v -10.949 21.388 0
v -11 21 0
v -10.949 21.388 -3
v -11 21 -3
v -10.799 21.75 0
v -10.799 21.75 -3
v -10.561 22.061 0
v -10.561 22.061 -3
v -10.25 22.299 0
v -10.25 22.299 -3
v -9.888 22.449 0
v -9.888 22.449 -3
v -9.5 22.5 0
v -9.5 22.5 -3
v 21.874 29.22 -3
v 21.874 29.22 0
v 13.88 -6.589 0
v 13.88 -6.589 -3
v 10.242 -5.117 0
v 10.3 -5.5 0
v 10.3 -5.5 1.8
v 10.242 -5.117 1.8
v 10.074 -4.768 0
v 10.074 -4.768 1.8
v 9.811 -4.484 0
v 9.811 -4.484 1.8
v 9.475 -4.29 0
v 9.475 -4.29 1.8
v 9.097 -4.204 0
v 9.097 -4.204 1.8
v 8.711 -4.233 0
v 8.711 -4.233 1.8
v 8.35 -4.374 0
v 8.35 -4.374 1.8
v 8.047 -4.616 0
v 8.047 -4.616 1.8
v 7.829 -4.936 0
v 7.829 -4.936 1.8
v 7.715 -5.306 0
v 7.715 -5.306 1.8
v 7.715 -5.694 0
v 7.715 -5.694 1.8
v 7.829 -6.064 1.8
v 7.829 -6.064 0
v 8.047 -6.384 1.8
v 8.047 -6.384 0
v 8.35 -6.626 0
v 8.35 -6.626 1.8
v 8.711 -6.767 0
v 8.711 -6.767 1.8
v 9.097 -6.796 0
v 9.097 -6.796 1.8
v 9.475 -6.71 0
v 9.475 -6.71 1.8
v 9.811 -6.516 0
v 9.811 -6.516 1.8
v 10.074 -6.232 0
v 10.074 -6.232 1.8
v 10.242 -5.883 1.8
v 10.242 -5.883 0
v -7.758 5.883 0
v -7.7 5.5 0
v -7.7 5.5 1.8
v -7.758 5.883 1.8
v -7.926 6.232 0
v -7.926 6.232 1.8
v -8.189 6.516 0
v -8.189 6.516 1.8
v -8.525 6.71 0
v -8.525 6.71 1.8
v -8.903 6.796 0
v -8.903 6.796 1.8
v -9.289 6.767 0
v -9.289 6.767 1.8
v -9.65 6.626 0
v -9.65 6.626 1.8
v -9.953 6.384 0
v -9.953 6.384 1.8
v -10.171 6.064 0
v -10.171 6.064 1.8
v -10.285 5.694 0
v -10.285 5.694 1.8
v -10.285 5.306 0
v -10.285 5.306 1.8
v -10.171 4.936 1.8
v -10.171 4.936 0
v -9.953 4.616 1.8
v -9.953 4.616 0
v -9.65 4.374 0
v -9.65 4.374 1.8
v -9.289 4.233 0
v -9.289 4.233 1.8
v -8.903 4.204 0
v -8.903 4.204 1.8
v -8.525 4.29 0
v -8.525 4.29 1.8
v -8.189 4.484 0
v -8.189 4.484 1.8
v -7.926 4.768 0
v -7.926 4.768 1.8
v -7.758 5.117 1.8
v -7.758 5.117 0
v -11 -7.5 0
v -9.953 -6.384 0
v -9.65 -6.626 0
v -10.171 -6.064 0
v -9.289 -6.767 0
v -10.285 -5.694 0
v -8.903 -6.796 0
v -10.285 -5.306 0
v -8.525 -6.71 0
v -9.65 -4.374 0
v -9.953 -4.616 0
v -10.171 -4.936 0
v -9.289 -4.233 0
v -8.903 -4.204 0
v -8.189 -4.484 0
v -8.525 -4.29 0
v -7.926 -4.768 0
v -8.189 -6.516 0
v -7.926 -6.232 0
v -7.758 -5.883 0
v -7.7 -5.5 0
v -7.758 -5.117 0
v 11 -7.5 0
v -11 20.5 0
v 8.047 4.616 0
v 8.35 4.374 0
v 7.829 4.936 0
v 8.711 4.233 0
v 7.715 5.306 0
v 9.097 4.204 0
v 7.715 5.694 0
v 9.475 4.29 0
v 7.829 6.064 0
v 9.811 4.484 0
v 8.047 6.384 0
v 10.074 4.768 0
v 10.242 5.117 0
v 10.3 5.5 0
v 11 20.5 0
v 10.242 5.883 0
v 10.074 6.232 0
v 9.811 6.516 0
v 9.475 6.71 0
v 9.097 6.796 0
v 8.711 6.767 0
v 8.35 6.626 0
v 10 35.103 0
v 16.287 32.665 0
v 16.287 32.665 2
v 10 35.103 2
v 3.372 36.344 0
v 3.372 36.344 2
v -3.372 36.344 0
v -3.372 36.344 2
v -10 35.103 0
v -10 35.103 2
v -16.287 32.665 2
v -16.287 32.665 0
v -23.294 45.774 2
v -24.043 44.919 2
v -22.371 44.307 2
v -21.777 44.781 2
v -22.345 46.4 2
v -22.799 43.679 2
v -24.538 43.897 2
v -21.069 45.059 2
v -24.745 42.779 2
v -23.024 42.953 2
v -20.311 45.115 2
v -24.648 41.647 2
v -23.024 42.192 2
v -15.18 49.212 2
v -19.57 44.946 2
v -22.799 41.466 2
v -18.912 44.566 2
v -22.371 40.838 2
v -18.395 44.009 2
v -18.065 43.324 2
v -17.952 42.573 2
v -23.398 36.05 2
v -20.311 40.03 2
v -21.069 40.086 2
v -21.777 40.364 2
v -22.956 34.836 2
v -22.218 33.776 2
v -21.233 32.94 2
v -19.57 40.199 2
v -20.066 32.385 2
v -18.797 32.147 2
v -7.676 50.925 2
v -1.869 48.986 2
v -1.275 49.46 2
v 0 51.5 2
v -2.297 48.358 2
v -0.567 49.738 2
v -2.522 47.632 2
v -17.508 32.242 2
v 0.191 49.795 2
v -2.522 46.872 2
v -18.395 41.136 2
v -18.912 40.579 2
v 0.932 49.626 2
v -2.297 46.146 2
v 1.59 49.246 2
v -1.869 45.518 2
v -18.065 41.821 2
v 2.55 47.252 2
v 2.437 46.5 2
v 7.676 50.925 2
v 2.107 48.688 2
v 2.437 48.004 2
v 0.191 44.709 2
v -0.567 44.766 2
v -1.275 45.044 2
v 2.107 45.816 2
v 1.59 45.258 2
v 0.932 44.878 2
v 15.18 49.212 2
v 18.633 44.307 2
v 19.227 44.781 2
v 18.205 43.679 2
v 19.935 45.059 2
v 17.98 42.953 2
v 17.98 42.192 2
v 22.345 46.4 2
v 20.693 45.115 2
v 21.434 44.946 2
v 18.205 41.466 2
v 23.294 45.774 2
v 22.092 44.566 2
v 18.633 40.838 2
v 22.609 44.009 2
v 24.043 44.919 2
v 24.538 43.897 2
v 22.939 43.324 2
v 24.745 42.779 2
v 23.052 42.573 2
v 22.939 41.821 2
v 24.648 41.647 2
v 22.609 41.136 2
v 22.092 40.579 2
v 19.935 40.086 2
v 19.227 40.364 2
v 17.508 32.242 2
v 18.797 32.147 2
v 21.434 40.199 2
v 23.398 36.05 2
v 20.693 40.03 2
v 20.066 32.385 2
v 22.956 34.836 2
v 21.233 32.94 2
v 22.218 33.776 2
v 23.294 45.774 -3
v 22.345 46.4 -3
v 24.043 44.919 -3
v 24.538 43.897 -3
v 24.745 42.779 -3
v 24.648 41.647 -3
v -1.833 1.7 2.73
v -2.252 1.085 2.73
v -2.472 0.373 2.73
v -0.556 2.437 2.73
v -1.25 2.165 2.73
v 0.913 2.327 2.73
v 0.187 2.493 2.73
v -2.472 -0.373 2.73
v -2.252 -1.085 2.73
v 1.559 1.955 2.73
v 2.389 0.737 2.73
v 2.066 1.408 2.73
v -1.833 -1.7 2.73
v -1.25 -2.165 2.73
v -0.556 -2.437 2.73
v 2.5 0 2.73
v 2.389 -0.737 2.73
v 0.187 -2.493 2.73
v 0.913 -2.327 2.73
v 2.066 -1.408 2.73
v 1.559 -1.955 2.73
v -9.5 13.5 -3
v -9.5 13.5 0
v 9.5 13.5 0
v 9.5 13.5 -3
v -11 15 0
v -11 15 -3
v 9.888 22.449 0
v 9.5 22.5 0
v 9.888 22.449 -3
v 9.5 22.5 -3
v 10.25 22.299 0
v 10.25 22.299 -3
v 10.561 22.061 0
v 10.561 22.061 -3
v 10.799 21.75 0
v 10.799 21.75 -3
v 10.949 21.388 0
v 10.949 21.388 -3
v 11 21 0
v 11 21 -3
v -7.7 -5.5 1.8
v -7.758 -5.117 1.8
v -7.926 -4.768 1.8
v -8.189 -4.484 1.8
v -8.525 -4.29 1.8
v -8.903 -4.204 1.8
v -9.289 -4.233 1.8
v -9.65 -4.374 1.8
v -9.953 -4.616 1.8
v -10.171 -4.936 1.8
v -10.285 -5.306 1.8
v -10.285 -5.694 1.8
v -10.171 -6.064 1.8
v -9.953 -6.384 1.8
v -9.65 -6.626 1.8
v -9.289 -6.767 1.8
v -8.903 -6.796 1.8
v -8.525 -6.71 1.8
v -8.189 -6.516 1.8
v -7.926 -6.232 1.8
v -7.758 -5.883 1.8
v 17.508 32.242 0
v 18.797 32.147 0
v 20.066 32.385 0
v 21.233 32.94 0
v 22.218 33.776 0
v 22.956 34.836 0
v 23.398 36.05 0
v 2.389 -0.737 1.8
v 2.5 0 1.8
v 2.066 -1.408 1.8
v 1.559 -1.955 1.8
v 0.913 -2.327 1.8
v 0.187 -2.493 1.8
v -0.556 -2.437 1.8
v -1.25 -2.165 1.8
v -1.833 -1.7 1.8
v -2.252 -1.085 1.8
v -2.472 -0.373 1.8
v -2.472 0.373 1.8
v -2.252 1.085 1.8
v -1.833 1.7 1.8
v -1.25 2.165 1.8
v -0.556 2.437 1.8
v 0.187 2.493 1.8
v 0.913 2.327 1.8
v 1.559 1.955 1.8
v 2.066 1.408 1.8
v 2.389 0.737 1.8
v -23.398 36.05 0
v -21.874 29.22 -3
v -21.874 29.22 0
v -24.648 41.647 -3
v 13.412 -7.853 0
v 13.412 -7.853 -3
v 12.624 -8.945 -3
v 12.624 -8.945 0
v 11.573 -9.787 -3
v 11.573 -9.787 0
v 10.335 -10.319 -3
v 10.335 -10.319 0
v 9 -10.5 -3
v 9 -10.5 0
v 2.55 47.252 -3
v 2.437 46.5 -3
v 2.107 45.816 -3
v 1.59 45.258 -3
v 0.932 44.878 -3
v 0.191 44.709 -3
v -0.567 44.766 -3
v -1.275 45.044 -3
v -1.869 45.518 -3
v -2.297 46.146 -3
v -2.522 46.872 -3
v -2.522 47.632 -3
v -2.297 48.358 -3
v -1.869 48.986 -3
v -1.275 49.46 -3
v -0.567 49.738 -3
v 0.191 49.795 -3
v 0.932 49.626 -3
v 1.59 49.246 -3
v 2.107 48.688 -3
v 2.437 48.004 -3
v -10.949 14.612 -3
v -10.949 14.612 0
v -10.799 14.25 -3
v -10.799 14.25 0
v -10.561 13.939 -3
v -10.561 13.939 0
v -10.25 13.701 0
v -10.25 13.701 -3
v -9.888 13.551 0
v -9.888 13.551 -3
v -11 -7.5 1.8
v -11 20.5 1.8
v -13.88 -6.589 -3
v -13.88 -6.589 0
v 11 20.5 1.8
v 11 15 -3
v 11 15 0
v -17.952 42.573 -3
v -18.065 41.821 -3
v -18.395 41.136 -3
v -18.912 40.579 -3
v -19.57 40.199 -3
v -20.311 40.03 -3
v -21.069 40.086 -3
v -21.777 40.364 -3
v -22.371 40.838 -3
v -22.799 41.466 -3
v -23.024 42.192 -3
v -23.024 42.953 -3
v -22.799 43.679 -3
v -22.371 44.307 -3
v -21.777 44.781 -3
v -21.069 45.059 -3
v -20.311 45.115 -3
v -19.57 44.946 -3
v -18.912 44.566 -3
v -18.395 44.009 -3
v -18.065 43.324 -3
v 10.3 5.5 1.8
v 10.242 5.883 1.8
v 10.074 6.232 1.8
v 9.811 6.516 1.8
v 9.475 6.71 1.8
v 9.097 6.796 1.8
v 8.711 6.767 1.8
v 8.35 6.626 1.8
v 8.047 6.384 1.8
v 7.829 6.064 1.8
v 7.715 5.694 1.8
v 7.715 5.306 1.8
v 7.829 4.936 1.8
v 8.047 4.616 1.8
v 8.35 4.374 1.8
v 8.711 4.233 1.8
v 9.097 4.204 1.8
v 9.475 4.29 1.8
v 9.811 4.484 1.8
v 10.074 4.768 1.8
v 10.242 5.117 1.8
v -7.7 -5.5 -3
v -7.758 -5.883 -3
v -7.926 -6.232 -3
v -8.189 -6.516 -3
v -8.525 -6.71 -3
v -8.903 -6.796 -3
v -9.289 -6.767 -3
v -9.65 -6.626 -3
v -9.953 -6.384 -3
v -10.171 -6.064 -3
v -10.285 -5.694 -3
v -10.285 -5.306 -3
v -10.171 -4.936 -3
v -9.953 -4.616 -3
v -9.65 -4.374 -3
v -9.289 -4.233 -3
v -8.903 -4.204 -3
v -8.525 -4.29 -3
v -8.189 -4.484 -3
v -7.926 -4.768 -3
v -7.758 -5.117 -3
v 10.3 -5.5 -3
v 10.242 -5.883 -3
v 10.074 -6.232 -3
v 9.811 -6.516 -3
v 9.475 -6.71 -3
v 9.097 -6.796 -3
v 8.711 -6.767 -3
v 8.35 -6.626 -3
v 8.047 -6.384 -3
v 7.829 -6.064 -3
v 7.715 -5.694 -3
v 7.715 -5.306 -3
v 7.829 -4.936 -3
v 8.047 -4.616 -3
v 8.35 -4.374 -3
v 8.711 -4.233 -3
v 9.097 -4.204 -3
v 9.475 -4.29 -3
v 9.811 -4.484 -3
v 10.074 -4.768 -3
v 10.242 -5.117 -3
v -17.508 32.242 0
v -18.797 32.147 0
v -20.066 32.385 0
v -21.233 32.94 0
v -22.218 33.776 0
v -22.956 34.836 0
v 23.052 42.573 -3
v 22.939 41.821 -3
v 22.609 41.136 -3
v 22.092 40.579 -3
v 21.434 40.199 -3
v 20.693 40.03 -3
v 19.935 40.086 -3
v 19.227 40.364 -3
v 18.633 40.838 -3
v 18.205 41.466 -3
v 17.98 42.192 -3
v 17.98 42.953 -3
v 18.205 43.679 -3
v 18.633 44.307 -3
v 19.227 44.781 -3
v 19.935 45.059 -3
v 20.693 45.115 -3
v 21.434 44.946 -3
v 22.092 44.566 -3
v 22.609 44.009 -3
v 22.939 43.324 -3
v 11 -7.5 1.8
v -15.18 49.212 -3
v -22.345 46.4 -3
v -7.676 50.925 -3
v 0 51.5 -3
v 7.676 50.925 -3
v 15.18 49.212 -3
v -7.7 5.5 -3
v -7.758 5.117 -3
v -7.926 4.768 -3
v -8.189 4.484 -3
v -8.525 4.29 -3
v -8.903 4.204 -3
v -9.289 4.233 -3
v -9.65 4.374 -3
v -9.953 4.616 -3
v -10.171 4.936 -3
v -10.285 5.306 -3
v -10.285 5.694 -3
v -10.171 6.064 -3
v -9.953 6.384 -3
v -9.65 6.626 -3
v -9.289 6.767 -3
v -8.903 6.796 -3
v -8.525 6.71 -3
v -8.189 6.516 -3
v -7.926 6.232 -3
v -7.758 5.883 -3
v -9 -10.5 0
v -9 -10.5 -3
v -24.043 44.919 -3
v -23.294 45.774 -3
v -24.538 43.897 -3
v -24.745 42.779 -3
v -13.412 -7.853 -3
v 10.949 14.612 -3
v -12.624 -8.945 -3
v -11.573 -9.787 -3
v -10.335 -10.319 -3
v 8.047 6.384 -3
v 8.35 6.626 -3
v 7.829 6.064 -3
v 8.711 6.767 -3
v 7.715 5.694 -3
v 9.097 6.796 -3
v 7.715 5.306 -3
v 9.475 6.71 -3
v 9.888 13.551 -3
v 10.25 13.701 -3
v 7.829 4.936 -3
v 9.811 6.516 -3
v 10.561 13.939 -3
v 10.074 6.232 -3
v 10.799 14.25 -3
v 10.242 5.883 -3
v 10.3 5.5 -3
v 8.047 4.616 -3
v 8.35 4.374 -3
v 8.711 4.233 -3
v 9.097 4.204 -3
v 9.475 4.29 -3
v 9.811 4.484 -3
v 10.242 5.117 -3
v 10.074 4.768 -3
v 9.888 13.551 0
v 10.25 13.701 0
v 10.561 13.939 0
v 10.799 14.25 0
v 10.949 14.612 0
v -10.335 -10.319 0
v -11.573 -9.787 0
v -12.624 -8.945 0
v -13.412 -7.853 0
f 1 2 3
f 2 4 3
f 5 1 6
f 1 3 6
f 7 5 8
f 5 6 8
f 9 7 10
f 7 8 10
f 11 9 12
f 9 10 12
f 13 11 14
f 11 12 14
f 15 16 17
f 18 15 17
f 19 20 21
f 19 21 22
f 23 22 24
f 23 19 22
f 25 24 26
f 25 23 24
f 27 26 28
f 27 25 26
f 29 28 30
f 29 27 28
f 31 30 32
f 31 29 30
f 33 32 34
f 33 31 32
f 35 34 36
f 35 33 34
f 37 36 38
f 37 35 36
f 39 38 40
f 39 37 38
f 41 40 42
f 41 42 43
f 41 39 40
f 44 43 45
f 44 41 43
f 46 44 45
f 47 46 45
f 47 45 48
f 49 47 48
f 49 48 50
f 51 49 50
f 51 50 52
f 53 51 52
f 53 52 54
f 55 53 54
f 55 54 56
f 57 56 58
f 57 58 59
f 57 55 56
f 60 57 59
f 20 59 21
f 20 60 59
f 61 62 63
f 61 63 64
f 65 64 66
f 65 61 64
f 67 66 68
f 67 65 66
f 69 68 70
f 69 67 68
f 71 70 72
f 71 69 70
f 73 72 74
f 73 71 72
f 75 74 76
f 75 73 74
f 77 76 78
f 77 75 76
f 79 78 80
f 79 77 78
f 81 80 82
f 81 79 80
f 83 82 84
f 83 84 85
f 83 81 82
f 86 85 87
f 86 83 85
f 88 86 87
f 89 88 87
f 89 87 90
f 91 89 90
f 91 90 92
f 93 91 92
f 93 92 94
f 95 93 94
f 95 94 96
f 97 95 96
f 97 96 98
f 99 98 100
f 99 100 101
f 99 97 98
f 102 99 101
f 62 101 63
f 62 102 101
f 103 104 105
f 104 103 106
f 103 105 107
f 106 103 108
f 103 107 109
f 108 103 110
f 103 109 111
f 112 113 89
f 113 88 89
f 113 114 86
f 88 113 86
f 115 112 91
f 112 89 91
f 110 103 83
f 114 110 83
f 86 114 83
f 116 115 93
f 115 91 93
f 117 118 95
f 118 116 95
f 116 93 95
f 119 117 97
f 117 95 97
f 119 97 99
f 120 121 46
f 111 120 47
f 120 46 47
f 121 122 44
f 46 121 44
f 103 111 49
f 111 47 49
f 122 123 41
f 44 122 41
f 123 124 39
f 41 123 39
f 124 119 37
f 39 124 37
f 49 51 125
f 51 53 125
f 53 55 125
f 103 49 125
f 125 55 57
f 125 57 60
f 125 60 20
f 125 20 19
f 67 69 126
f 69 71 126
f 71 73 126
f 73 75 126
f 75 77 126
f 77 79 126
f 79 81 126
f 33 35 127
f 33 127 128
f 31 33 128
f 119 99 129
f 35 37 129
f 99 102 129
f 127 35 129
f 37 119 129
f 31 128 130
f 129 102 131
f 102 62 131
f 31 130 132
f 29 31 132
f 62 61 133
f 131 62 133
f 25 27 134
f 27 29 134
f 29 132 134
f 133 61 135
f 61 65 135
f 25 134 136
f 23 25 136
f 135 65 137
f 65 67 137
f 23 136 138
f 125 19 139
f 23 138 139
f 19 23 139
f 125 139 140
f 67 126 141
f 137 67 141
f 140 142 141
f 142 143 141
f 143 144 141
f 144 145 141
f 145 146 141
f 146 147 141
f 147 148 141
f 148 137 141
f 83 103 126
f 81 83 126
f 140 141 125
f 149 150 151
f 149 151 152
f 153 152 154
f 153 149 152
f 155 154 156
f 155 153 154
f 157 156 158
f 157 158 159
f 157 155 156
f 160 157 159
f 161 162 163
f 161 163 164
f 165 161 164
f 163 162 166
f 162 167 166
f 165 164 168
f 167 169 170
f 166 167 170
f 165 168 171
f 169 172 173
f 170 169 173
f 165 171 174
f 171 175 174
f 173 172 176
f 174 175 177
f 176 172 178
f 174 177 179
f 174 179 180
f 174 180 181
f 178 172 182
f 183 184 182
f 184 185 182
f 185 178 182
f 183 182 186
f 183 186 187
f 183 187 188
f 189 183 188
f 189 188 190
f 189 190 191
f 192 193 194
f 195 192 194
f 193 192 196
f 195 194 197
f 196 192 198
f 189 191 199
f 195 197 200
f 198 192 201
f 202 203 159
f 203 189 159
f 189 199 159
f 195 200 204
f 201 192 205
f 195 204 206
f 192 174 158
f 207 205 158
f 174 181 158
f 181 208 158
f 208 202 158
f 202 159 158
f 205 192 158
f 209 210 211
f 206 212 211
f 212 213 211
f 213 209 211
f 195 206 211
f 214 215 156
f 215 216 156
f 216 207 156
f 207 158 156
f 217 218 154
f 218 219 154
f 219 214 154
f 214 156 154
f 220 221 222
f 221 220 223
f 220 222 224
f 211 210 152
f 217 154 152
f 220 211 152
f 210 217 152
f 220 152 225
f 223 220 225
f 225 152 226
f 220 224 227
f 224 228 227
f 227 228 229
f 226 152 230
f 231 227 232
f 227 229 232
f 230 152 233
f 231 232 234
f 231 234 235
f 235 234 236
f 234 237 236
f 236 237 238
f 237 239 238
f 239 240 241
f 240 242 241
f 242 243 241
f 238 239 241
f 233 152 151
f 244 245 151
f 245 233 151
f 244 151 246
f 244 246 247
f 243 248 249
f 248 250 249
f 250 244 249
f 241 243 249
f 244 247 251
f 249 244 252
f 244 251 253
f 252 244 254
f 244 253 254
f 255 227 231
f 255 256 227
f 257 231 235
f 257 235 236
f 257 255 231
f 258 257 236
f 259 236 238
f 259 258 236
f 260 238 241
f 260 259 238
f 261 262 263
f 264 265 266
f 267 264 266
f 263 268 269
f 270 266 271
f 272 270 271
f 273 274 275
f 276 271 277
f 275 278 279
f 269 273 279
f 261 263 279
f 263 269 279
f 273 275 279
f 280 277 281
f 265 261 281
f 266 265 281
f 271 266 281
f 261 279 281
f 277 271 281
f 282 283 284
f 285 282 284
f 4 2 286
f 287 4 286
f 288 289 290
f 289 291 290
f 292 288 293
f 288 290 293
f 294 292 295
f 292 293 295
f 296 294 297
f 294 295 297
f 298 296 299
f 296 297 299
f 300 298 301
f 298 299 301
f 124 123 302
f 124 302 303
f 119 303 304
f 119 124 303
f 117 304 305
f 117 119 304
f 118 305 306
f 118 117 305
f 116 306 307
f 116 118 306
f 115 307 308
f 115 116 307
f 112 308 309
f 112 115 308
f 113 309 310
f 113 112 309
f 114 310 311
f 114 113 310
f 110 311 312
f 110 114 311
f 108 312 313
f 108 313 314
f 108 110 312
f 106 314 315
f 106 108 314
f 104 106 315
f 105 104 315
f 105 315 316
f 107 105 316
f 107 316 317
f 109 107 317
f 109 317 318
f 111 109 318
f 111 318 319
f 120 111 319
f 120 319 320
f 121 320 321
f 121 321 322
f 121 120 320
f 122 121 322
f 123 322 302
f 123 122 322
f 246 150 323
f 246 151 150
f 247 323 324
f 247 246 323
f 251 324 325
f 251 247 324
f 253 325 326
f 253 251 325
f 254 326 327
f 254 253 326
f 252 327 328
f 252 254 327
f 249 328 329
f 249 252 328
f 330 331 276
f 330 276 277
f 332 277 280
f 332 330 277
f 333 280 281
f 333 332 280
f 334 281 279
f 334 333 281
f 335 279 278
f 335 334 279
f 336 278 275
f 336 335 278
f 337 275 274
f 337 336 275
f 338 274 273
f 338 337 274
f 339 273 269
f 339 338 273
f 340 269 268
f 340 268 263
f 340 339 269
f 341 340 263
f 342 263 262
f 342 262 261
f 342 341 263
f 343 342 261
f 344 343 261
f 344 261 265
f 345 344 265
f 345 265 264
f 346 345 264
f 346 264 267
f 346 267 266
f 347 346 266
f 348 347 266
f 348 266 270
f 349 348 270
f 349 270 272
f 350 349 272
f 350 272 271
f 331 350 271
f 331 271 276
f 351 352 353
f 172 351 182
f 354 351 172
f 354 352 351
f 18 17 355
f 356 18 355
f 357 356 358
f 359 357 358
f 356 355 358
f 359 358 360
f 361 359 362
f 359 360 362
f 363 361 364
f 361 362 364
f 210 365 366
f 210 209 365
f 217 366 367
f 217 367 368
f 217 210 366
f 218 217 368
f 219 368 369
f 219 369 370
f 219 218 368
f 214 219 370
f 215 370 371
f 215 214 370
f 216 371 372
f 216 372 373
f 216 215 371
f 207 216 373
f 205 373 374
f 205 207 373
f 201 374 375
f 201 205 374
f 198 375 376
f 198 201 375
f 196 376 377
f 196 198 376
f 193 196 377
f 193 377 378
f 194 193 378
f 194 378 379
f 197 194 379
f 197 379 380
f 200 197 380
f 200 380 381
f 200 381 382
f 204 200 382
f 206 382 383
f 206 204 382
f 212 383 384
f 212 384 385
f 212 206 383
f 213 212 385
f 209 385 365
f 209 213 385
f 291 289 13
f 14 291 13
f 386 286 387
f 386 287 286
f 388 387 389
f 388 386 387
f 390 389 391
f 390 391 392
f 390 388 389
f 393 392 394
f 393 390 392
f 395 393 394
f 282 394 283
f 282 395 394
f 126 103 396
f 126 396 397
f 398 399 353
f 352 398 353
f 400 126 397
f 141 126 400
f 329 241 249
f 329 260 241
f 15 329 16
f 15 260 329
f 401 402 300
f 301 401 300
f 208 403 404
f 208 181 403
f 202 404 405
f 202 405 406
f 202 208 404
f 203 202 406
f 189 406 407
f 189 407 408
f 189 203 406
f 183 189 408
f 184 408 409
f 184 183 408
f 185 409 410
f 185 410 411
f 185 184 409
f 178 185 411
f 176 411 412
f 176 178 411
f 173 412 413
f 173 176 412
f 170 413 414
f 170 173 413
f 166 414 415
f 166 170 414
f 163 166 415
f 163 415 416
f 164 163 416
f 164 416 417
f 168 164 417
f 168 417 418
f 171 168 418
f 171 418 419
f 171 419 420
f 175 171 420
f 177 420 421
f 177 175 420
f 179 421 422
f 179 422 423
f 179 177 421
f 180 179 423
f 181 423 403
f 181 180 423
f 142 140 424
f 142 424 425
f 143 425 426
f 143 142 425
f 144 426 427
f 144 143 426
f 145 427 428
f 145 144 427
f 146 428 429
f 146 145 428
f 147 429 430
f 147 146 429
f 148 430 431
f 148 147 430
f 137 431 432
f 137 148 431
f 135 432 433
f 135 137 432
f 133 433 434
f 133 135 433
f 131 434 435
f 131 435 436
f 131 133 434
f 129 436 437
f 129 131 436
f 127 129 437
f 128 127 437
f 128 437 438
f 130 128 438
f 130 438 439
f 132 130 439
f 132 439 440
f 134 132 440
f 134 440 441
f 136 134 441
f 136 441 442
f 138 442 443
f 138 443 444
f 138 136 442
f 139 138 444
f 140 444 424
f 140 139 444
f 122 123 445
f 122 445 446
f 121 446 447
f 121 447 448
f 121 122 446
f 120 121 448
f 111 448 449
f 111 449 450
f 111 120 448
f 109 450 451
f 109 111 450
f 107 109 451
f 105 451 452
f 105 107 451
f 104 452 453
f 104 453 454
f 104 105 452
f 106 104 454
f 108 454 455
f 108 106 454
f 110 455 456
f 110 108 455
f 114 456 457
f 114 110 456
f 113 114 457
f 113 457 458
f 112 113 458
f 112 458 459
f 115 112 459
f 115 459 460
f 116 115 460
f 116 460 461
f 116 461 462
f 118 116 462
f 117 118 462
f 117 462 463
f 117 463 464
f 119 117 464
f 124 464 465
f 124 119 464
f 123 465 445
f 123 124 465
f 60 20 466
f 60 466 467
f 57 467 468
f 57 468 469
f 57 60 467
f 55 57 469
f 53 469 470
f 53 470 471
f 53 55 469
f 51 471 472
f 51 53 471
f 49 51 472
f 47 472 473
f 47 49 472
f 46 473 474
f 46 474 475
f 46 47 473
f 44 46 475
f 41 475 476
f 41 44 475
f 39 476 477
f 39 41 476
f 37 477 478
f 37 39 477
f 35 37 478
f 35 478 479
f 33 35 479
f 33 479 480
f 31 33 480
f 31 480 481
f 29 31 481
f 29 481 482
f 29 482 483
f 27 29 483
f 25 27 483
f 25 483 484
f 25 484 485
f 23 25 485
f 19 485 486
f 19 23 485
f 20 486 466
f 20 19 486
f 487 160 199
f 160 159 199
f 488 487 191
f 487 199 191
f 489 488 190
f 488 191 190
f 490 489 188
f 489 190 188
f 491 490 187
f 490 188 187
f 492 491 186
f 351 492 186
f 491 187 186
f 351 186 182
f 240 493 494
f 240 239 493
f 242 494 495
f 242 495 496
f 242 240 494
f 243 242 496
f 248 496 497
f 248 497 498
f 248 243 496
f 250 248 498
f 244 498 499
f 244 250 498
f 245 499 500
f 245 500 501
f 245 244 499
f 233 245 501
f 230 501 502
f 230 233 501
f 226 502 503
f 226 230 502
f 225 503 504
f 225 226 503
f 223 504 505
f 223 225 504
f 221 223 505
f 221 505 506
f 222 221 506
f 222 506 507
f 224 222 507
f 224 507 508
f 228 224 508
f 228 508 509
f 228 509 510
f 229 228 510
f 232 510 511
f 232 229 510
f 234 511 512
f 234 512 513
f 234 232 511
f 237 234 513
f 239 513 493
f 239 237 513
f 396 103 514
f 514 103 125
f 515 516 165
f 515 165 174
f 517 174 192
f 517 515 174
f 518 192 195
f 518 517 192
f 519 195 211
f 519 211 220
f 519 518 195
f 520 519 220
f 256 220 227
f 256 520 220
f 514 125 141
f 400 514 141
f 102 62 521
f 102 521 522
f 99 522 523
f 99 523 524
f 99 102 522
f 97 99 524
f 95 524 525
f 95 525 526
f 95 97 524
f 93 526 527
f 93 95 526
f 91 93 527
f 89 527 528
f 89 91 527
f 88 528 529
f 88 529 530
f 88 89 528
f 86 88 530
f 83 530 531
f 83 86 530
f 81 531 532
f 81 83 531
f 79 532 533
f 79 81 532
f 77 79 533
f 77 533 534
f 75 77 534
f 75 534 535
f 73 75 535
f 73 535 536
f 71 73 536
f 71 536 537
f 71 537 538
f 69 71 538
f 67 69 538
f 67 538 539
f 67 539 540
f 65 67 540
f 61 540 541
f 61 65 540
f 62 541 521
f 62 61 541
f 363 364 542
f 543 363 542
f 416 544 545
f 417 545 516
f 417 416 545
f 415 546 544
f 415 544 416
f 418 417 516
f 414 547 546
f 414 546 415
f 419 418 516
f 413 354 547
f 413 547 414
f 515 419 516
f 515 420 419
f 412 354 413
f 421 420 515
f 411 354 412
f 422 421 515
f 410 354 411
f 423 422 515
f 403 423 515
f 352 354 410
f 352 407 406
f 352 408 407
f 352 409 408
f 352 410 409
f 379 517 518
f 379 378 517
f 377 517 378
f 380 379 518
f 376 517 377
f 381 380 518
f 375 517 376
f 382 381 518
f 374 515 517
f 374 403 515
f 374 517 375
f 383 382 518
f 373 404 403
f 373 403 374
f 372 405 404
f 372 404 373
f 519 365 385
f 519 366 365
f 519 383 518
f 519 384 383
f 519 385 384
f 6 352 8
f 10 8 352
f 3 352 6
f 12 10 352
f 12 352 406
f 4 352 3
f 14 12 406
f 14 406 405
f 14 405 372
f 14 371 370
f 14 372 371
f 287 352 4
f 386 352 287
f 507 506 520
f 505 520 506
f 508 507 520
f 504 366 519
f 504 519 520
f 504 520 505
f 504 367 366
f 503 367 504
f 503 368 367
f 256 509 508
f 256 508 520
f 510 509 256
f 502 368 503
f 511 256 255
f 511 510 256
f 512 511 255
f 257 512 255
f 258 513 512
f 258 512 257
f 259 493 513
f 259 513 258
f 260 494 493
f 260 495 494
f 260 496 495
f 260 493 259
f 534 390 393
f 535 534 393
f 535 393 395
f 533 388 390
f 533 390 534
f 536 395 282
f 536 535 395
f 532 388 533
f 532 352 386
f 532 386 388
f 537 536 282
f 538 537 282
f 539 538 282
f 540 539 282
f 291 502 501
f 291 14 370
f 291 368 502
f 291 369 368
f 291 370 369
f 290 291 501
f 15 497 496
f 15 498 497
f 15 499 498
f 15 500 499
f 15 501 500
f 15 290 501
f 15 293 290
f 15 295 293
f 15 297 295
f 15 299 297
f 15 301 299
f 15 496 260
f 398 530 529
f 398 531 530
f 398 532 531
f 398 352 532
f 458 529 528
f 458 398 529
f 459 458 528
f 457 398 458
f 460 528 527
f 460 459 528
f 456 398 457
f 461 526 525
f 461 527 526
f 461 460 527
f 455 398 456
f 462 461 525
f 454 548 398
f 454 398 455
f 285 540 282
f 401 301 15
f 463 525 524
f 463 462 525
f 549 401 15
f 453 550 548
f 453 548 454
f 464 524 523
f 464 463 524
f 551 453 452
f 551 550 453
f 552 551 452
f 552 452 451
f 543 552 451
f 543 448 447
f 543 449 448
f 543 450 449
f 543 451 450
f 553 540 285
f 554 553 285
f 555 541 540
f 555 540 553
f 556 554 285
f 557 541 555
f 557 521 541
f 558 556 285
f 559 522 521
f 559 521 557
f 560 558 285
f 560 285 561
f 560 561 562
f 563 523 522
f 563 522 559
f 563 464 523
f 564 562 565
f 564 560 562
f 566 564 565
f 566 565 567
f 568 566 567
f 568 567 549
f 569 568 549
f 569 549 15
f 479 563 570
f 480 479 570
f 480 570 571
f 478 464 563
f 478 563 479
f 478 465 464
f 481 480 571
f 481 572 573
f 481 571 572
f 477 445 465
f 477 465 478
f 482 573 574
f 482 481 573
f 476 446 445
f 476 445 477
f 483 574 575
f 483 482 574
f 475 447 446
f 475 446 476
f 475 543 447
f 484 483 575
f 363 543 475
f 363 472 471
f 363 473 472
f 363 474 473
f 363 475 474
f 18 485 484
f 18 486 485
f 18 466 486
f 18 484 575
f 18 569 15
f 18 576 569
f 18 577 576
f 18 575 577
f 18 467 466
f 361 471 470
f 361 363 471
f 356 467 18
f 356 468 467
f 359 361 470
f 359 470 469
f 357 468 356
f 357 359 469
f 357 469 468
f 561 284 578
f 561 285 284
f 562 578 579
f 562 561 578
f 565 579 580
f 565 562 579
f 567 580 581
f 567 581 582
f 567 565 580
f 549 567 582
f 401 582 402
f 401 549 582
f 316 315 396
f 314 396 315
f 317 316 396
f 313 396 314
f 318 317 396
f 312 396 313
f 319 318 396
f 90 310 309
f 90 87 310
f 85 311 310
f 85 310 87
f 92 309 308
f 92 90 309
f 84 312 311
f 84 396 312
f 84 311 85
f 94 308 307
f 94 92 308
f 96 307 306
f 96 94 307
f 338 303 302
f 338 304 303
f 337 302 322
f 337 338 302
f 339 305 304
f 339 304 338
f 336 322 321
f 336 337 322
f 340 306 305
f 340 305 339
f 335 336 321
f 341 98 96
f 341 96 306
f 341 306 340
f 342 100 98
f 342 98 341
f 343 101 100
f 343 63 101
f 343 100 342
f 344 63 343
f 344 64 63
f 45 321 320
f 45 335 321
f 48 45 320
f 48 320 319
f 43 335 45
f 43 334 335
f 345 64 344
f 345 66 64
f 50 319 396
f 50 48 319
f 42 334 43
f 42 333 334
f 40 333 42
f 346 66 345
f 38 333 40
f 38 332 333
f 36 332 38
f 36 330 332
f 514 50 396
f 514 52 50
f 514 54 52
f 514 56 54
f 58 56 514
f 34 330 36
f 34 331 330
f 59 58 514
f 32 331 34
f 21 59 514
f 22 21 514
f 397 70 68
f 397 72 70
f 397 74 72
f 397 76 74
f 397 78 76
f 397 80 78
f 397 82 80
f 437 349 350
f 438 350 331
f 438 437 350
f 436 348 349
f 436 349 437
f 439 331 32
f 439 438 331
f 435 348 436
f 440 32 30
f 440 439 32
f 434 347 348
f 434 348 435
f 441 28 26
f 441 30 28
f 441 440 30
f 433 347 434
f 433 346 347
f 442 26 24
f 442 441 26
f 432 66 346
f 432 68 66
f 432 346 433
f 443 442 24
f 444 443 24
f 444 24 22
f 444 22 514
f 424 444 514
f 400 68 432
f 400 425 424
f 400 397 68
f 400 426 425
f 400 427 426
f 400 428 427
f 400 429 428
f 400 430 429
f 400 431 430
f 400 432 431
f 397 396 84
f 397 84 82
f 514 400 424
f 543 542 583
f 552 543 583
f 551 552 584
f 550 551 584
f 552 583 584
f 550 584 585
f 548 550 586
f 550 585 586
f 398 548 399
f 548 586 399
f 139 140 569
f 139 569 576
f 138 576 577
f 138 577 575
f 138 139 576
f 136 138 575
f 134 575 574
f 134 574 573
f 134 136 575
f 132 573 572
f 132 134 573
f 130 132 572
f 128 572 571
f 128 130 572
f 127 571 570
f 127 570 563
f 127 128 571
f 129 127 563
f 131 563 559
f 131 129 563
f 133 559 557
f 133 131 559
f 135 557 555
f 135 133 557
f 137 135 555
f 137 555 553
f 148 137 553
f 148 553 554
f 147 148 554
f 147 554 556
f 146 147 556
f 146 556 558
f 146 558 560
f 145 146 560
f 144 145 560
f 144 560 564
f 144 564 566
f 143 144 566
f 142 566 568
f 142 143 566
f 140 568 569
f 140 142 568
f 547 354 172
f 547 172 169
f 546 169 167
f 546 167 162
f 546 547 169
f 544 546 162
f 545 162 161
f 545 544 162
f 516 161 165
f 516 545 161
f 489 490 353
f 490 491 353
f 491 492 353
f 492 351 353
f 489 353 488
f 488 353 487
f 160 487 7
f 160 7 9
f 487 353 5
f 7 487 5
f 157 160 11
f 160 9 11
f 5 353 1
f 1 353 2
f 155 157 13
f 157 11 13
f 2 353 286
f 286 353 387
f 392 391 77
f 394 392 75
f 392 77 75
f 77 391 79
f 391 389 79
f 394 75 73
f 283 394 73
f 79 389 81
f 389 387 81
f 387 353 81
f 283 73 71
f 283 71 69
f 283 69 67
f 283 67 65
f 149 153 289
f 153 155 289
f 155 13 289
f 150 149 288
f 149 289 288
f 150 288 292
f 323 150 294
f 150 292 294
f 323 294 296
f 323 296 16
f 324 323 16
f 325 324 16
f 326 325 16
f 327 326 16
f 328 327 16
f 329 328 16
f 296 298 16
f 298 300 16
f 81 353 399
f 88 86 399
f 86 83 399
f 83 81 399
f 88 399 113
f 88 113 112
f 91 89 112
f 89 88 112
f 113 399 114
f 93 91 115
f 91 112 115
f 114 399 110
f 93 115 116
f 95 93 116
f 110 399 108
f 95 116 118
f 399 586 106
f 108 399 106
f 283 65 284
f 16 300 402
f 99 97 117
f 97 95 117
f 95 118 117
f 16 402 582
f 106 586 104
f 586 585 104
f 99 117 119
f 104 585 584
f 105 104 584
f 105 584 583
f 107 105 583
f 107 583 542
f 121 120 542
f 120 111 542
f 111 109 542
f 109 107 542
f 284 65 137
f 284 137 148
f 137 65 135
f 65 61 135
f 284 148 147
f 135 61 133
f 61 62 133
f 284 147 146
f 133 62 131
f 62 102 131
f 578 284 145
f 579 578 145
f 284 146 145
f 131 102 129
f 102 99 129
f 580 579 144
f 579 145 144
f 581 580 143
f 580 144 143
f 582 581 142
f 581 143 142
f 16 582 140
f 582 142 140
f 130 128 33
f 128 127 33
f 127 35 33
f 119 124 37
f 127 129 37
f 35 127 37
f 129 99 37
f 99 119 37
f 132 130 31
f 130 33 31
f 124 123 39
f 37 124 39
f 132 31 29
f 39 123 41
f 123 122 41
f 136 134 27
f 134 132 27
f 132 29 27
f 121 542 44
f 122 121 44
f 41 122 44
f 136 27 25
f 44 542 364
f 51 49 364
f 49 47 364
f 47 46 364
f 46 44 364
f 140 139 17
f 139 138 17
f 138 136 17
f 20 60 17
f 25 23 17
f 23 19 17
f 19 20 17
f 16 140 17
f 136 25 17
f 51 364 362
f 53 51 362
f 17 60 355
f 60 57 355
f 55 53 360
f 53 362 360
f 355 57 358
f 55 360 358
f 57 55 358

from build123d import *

# Parameters (mm, degrees)
F0_W     = 22
F0_H     = 28
F0_R     = 1.3
F0_R_2   = 2.5
F1_DEPTH = 1.8
F2_R     = 2.5
F3_DEPTH = 2.73
F4_R     = 2.55
F4_W     = 22
F4_H     = 21
F4_R_2   = 1.3
F5_DEPTH = 3
F6_DEPTH = 2
F7_R     = 5
F8_R     = 1.5


with BuildPart() as f1:
    # F0 (on Top) → F1 (new body)
    with BuildSketch(Plane.XY):
        with Locations((0, 6.5)):
            Rectangle(F0_W, F0_H)
        with Locations((-9, -5.5)):
            Circle(F0_R, mode=Mode.SUBTRACT)
        with Locations((-9, 5.5)):
            Circle(F0_R, mode=Mode.SUBTRACT)
        with Locations((9, -5.5)):
            Circle(F0_R, mode=Mode.SUBTRACT)
        Circle(F0_R_2, mode=Mode.SUBTRACT)
        with Locations((9, 5.5)):
            Circle(F0_R, mode=Mode.SUBTRACT)
    extrude(amount=F1_DEPTH)

    # F2 (on face) → F3 (join)
    with BuildSketch(Plane(origin=(0, 0, 0), x_dir=(1, 0, 0), z_dir=(0, 0, -1))):
        Circle(F2_R)
    extrude(amount=-F3_DEPTH)


with BuildPart() as f5:
    # F4 (on face) → F5 (new body)
    with BuildSketch(Plane(origin=(0, 0, 0), x_dir=(1, 0, 0), z_dir=(0, 0, -1))):
        with BuildLine():
            Line((9, 10.5), (-9, 10.5))
            ThreePointArc((-9, 10.5), (-12.1267541127, 9.4017186878), (-13.8798859815, 6.5893634874))
            Line((-13.8798859815, 6.5893634874), (-21.8737337821, -29.2196812171))
            ThreePointArc((-21.8737337821, -29.2196812171), (0, -36.5), (21.8737337821, -29.2196812171))
            Line((21.8737337821, -29.2196812171), (13.8798859815, 6.5893634874))
            ThreePointArc((13.8798859815, 6.5893634874), (12.1267541127, 9.4017186878), (9, 10.5))
        make_face()
        Polygon((-11, -20.5), (-11, -13.5), (-11, 7.5), (11, 7.5), (11, -13.5), (11, -20.5), (11, -22.5), (-11, -22.5), align=None, mode=Mode.SUBTRACT)
        with BuildLine():
            ThreePointArc((21.8737337821, -29.2196812171), (0, -36.5), (-21.8737337821, -29.2196812171))
            Line((-21.8737337821, -29.2196812171), (-24.6479511299, -41.6469972609))
            ThreePointArc((-24.6479511299, -41.6469972609), (-24.324916161, -44.4247666907), (-22.3451494117, -46.3998307946))
            ThreePointArc((-22.3451494117, -46.3998307946), (0, -51.5), (22.3451494117, -46.3998307946))
            ThreePointArc((22.3451494117, -46.3998307946), (24.324916161, -44.4247666907), (24.6479511299, -41.6469972609))
            Line((24.6479511299, -41.6469972609), (21.8737337821, -29.2196812171))
        make_face()
        with Locations((-20.502, -42.5725204798)):
            Circle(F4_R, mode=Mode.SUBTRACT)
        with Locations((0, -47.252)):
            Circle(F4_R, mode=Mode.SUBTRACT)
        with Locations((20.502, -42.5725204798)):
            Circle(F4_R, mode=Mode.SUBTRACT)
        with Locations((0, -3)):
            Rectangle(F4_W, F4_H)
        with Locations((-9, -5.5)):
            Circle(F4_R_2, mode=Mode.SUBTRACT)
        with Locations((-9, 5.5)):
            Circle(F4_R_2, mode=Mode.SUBTRACT)
        with Locations((9, -5.5)):
            Circle(F4_R_2, mode=Mode.SUBTRACT)
        with Locations((9, 5.5)):
            Circle(F4_R_2, mode=Mode.SUBTRACT)
    extrude(amount=F5_DEPTH)

    # F4 (on face) → F6 (join)
    with BuildSketch(Plane(origin=(0, 0, 0), x_dir=(1, 0, 0), z_dir=(0, 0, -1))):
        with BuildLine():
            ThreePointArc((21.8737337821, -29.2196812171), (0, -36.5), (-21.8737337821, -29.2196812171))
            Line((-21.8737337821, -29.2196812171), (-24.6479511299, -41.6469972609))
            ThreePointArc((-24.6479511299, -41.6469972609), (-24.324916161, -44.4247666907), (-22.3451494117, -46.3998307946))
            ThreePointArc((-22.3451494117, -46.3998307946), (0, -51.5), (22.3451494117, -46.3998307946))
            ThreePointArc((22.3451494117, -46.3998307946), (24.324916161, -44.4247666907), (24.6479511299, -41.6469972609))
            Line((24.6479511299, -41.6469972609), (21.8737337821, -29.2196812171))
        make_face()
        with Locations((-20.502, -42.5725204798)):
            Circle(F4_R, mode=Mode.SUBTRACT)
        with Locations((0, -47.252)):
            Circle(F4_R, mode=Mode.SUBTRACT)
        with Locations((20.502, -42.5725204798)):
            Circle(F4_R, mode=Mode.SUBTRACT)
    extrude(amount=-F6_DEPTH)

    # F7
    f7_edges = [f5.edges().sort_by_distance(p)[0] for p in [
        (21.873734, 29.219681, 1),
        (-21.873734, 29.219681, 1),
    ]]
    fillet(f7_edges, radius=F7_R)

    # F8
    f8_edges = [f5.edges().sort_by_distance(p)[0] for p in [
        (11, 22.5, -1.5),
        (11, 13.5, -1.5),
        (-11, 22.5, -1.5),
        (-11, 13.5, -1.5),
    ]]
    fillet(f8_edges, radius=F8_R)


solid = Compound([f1.part, f5.part])
